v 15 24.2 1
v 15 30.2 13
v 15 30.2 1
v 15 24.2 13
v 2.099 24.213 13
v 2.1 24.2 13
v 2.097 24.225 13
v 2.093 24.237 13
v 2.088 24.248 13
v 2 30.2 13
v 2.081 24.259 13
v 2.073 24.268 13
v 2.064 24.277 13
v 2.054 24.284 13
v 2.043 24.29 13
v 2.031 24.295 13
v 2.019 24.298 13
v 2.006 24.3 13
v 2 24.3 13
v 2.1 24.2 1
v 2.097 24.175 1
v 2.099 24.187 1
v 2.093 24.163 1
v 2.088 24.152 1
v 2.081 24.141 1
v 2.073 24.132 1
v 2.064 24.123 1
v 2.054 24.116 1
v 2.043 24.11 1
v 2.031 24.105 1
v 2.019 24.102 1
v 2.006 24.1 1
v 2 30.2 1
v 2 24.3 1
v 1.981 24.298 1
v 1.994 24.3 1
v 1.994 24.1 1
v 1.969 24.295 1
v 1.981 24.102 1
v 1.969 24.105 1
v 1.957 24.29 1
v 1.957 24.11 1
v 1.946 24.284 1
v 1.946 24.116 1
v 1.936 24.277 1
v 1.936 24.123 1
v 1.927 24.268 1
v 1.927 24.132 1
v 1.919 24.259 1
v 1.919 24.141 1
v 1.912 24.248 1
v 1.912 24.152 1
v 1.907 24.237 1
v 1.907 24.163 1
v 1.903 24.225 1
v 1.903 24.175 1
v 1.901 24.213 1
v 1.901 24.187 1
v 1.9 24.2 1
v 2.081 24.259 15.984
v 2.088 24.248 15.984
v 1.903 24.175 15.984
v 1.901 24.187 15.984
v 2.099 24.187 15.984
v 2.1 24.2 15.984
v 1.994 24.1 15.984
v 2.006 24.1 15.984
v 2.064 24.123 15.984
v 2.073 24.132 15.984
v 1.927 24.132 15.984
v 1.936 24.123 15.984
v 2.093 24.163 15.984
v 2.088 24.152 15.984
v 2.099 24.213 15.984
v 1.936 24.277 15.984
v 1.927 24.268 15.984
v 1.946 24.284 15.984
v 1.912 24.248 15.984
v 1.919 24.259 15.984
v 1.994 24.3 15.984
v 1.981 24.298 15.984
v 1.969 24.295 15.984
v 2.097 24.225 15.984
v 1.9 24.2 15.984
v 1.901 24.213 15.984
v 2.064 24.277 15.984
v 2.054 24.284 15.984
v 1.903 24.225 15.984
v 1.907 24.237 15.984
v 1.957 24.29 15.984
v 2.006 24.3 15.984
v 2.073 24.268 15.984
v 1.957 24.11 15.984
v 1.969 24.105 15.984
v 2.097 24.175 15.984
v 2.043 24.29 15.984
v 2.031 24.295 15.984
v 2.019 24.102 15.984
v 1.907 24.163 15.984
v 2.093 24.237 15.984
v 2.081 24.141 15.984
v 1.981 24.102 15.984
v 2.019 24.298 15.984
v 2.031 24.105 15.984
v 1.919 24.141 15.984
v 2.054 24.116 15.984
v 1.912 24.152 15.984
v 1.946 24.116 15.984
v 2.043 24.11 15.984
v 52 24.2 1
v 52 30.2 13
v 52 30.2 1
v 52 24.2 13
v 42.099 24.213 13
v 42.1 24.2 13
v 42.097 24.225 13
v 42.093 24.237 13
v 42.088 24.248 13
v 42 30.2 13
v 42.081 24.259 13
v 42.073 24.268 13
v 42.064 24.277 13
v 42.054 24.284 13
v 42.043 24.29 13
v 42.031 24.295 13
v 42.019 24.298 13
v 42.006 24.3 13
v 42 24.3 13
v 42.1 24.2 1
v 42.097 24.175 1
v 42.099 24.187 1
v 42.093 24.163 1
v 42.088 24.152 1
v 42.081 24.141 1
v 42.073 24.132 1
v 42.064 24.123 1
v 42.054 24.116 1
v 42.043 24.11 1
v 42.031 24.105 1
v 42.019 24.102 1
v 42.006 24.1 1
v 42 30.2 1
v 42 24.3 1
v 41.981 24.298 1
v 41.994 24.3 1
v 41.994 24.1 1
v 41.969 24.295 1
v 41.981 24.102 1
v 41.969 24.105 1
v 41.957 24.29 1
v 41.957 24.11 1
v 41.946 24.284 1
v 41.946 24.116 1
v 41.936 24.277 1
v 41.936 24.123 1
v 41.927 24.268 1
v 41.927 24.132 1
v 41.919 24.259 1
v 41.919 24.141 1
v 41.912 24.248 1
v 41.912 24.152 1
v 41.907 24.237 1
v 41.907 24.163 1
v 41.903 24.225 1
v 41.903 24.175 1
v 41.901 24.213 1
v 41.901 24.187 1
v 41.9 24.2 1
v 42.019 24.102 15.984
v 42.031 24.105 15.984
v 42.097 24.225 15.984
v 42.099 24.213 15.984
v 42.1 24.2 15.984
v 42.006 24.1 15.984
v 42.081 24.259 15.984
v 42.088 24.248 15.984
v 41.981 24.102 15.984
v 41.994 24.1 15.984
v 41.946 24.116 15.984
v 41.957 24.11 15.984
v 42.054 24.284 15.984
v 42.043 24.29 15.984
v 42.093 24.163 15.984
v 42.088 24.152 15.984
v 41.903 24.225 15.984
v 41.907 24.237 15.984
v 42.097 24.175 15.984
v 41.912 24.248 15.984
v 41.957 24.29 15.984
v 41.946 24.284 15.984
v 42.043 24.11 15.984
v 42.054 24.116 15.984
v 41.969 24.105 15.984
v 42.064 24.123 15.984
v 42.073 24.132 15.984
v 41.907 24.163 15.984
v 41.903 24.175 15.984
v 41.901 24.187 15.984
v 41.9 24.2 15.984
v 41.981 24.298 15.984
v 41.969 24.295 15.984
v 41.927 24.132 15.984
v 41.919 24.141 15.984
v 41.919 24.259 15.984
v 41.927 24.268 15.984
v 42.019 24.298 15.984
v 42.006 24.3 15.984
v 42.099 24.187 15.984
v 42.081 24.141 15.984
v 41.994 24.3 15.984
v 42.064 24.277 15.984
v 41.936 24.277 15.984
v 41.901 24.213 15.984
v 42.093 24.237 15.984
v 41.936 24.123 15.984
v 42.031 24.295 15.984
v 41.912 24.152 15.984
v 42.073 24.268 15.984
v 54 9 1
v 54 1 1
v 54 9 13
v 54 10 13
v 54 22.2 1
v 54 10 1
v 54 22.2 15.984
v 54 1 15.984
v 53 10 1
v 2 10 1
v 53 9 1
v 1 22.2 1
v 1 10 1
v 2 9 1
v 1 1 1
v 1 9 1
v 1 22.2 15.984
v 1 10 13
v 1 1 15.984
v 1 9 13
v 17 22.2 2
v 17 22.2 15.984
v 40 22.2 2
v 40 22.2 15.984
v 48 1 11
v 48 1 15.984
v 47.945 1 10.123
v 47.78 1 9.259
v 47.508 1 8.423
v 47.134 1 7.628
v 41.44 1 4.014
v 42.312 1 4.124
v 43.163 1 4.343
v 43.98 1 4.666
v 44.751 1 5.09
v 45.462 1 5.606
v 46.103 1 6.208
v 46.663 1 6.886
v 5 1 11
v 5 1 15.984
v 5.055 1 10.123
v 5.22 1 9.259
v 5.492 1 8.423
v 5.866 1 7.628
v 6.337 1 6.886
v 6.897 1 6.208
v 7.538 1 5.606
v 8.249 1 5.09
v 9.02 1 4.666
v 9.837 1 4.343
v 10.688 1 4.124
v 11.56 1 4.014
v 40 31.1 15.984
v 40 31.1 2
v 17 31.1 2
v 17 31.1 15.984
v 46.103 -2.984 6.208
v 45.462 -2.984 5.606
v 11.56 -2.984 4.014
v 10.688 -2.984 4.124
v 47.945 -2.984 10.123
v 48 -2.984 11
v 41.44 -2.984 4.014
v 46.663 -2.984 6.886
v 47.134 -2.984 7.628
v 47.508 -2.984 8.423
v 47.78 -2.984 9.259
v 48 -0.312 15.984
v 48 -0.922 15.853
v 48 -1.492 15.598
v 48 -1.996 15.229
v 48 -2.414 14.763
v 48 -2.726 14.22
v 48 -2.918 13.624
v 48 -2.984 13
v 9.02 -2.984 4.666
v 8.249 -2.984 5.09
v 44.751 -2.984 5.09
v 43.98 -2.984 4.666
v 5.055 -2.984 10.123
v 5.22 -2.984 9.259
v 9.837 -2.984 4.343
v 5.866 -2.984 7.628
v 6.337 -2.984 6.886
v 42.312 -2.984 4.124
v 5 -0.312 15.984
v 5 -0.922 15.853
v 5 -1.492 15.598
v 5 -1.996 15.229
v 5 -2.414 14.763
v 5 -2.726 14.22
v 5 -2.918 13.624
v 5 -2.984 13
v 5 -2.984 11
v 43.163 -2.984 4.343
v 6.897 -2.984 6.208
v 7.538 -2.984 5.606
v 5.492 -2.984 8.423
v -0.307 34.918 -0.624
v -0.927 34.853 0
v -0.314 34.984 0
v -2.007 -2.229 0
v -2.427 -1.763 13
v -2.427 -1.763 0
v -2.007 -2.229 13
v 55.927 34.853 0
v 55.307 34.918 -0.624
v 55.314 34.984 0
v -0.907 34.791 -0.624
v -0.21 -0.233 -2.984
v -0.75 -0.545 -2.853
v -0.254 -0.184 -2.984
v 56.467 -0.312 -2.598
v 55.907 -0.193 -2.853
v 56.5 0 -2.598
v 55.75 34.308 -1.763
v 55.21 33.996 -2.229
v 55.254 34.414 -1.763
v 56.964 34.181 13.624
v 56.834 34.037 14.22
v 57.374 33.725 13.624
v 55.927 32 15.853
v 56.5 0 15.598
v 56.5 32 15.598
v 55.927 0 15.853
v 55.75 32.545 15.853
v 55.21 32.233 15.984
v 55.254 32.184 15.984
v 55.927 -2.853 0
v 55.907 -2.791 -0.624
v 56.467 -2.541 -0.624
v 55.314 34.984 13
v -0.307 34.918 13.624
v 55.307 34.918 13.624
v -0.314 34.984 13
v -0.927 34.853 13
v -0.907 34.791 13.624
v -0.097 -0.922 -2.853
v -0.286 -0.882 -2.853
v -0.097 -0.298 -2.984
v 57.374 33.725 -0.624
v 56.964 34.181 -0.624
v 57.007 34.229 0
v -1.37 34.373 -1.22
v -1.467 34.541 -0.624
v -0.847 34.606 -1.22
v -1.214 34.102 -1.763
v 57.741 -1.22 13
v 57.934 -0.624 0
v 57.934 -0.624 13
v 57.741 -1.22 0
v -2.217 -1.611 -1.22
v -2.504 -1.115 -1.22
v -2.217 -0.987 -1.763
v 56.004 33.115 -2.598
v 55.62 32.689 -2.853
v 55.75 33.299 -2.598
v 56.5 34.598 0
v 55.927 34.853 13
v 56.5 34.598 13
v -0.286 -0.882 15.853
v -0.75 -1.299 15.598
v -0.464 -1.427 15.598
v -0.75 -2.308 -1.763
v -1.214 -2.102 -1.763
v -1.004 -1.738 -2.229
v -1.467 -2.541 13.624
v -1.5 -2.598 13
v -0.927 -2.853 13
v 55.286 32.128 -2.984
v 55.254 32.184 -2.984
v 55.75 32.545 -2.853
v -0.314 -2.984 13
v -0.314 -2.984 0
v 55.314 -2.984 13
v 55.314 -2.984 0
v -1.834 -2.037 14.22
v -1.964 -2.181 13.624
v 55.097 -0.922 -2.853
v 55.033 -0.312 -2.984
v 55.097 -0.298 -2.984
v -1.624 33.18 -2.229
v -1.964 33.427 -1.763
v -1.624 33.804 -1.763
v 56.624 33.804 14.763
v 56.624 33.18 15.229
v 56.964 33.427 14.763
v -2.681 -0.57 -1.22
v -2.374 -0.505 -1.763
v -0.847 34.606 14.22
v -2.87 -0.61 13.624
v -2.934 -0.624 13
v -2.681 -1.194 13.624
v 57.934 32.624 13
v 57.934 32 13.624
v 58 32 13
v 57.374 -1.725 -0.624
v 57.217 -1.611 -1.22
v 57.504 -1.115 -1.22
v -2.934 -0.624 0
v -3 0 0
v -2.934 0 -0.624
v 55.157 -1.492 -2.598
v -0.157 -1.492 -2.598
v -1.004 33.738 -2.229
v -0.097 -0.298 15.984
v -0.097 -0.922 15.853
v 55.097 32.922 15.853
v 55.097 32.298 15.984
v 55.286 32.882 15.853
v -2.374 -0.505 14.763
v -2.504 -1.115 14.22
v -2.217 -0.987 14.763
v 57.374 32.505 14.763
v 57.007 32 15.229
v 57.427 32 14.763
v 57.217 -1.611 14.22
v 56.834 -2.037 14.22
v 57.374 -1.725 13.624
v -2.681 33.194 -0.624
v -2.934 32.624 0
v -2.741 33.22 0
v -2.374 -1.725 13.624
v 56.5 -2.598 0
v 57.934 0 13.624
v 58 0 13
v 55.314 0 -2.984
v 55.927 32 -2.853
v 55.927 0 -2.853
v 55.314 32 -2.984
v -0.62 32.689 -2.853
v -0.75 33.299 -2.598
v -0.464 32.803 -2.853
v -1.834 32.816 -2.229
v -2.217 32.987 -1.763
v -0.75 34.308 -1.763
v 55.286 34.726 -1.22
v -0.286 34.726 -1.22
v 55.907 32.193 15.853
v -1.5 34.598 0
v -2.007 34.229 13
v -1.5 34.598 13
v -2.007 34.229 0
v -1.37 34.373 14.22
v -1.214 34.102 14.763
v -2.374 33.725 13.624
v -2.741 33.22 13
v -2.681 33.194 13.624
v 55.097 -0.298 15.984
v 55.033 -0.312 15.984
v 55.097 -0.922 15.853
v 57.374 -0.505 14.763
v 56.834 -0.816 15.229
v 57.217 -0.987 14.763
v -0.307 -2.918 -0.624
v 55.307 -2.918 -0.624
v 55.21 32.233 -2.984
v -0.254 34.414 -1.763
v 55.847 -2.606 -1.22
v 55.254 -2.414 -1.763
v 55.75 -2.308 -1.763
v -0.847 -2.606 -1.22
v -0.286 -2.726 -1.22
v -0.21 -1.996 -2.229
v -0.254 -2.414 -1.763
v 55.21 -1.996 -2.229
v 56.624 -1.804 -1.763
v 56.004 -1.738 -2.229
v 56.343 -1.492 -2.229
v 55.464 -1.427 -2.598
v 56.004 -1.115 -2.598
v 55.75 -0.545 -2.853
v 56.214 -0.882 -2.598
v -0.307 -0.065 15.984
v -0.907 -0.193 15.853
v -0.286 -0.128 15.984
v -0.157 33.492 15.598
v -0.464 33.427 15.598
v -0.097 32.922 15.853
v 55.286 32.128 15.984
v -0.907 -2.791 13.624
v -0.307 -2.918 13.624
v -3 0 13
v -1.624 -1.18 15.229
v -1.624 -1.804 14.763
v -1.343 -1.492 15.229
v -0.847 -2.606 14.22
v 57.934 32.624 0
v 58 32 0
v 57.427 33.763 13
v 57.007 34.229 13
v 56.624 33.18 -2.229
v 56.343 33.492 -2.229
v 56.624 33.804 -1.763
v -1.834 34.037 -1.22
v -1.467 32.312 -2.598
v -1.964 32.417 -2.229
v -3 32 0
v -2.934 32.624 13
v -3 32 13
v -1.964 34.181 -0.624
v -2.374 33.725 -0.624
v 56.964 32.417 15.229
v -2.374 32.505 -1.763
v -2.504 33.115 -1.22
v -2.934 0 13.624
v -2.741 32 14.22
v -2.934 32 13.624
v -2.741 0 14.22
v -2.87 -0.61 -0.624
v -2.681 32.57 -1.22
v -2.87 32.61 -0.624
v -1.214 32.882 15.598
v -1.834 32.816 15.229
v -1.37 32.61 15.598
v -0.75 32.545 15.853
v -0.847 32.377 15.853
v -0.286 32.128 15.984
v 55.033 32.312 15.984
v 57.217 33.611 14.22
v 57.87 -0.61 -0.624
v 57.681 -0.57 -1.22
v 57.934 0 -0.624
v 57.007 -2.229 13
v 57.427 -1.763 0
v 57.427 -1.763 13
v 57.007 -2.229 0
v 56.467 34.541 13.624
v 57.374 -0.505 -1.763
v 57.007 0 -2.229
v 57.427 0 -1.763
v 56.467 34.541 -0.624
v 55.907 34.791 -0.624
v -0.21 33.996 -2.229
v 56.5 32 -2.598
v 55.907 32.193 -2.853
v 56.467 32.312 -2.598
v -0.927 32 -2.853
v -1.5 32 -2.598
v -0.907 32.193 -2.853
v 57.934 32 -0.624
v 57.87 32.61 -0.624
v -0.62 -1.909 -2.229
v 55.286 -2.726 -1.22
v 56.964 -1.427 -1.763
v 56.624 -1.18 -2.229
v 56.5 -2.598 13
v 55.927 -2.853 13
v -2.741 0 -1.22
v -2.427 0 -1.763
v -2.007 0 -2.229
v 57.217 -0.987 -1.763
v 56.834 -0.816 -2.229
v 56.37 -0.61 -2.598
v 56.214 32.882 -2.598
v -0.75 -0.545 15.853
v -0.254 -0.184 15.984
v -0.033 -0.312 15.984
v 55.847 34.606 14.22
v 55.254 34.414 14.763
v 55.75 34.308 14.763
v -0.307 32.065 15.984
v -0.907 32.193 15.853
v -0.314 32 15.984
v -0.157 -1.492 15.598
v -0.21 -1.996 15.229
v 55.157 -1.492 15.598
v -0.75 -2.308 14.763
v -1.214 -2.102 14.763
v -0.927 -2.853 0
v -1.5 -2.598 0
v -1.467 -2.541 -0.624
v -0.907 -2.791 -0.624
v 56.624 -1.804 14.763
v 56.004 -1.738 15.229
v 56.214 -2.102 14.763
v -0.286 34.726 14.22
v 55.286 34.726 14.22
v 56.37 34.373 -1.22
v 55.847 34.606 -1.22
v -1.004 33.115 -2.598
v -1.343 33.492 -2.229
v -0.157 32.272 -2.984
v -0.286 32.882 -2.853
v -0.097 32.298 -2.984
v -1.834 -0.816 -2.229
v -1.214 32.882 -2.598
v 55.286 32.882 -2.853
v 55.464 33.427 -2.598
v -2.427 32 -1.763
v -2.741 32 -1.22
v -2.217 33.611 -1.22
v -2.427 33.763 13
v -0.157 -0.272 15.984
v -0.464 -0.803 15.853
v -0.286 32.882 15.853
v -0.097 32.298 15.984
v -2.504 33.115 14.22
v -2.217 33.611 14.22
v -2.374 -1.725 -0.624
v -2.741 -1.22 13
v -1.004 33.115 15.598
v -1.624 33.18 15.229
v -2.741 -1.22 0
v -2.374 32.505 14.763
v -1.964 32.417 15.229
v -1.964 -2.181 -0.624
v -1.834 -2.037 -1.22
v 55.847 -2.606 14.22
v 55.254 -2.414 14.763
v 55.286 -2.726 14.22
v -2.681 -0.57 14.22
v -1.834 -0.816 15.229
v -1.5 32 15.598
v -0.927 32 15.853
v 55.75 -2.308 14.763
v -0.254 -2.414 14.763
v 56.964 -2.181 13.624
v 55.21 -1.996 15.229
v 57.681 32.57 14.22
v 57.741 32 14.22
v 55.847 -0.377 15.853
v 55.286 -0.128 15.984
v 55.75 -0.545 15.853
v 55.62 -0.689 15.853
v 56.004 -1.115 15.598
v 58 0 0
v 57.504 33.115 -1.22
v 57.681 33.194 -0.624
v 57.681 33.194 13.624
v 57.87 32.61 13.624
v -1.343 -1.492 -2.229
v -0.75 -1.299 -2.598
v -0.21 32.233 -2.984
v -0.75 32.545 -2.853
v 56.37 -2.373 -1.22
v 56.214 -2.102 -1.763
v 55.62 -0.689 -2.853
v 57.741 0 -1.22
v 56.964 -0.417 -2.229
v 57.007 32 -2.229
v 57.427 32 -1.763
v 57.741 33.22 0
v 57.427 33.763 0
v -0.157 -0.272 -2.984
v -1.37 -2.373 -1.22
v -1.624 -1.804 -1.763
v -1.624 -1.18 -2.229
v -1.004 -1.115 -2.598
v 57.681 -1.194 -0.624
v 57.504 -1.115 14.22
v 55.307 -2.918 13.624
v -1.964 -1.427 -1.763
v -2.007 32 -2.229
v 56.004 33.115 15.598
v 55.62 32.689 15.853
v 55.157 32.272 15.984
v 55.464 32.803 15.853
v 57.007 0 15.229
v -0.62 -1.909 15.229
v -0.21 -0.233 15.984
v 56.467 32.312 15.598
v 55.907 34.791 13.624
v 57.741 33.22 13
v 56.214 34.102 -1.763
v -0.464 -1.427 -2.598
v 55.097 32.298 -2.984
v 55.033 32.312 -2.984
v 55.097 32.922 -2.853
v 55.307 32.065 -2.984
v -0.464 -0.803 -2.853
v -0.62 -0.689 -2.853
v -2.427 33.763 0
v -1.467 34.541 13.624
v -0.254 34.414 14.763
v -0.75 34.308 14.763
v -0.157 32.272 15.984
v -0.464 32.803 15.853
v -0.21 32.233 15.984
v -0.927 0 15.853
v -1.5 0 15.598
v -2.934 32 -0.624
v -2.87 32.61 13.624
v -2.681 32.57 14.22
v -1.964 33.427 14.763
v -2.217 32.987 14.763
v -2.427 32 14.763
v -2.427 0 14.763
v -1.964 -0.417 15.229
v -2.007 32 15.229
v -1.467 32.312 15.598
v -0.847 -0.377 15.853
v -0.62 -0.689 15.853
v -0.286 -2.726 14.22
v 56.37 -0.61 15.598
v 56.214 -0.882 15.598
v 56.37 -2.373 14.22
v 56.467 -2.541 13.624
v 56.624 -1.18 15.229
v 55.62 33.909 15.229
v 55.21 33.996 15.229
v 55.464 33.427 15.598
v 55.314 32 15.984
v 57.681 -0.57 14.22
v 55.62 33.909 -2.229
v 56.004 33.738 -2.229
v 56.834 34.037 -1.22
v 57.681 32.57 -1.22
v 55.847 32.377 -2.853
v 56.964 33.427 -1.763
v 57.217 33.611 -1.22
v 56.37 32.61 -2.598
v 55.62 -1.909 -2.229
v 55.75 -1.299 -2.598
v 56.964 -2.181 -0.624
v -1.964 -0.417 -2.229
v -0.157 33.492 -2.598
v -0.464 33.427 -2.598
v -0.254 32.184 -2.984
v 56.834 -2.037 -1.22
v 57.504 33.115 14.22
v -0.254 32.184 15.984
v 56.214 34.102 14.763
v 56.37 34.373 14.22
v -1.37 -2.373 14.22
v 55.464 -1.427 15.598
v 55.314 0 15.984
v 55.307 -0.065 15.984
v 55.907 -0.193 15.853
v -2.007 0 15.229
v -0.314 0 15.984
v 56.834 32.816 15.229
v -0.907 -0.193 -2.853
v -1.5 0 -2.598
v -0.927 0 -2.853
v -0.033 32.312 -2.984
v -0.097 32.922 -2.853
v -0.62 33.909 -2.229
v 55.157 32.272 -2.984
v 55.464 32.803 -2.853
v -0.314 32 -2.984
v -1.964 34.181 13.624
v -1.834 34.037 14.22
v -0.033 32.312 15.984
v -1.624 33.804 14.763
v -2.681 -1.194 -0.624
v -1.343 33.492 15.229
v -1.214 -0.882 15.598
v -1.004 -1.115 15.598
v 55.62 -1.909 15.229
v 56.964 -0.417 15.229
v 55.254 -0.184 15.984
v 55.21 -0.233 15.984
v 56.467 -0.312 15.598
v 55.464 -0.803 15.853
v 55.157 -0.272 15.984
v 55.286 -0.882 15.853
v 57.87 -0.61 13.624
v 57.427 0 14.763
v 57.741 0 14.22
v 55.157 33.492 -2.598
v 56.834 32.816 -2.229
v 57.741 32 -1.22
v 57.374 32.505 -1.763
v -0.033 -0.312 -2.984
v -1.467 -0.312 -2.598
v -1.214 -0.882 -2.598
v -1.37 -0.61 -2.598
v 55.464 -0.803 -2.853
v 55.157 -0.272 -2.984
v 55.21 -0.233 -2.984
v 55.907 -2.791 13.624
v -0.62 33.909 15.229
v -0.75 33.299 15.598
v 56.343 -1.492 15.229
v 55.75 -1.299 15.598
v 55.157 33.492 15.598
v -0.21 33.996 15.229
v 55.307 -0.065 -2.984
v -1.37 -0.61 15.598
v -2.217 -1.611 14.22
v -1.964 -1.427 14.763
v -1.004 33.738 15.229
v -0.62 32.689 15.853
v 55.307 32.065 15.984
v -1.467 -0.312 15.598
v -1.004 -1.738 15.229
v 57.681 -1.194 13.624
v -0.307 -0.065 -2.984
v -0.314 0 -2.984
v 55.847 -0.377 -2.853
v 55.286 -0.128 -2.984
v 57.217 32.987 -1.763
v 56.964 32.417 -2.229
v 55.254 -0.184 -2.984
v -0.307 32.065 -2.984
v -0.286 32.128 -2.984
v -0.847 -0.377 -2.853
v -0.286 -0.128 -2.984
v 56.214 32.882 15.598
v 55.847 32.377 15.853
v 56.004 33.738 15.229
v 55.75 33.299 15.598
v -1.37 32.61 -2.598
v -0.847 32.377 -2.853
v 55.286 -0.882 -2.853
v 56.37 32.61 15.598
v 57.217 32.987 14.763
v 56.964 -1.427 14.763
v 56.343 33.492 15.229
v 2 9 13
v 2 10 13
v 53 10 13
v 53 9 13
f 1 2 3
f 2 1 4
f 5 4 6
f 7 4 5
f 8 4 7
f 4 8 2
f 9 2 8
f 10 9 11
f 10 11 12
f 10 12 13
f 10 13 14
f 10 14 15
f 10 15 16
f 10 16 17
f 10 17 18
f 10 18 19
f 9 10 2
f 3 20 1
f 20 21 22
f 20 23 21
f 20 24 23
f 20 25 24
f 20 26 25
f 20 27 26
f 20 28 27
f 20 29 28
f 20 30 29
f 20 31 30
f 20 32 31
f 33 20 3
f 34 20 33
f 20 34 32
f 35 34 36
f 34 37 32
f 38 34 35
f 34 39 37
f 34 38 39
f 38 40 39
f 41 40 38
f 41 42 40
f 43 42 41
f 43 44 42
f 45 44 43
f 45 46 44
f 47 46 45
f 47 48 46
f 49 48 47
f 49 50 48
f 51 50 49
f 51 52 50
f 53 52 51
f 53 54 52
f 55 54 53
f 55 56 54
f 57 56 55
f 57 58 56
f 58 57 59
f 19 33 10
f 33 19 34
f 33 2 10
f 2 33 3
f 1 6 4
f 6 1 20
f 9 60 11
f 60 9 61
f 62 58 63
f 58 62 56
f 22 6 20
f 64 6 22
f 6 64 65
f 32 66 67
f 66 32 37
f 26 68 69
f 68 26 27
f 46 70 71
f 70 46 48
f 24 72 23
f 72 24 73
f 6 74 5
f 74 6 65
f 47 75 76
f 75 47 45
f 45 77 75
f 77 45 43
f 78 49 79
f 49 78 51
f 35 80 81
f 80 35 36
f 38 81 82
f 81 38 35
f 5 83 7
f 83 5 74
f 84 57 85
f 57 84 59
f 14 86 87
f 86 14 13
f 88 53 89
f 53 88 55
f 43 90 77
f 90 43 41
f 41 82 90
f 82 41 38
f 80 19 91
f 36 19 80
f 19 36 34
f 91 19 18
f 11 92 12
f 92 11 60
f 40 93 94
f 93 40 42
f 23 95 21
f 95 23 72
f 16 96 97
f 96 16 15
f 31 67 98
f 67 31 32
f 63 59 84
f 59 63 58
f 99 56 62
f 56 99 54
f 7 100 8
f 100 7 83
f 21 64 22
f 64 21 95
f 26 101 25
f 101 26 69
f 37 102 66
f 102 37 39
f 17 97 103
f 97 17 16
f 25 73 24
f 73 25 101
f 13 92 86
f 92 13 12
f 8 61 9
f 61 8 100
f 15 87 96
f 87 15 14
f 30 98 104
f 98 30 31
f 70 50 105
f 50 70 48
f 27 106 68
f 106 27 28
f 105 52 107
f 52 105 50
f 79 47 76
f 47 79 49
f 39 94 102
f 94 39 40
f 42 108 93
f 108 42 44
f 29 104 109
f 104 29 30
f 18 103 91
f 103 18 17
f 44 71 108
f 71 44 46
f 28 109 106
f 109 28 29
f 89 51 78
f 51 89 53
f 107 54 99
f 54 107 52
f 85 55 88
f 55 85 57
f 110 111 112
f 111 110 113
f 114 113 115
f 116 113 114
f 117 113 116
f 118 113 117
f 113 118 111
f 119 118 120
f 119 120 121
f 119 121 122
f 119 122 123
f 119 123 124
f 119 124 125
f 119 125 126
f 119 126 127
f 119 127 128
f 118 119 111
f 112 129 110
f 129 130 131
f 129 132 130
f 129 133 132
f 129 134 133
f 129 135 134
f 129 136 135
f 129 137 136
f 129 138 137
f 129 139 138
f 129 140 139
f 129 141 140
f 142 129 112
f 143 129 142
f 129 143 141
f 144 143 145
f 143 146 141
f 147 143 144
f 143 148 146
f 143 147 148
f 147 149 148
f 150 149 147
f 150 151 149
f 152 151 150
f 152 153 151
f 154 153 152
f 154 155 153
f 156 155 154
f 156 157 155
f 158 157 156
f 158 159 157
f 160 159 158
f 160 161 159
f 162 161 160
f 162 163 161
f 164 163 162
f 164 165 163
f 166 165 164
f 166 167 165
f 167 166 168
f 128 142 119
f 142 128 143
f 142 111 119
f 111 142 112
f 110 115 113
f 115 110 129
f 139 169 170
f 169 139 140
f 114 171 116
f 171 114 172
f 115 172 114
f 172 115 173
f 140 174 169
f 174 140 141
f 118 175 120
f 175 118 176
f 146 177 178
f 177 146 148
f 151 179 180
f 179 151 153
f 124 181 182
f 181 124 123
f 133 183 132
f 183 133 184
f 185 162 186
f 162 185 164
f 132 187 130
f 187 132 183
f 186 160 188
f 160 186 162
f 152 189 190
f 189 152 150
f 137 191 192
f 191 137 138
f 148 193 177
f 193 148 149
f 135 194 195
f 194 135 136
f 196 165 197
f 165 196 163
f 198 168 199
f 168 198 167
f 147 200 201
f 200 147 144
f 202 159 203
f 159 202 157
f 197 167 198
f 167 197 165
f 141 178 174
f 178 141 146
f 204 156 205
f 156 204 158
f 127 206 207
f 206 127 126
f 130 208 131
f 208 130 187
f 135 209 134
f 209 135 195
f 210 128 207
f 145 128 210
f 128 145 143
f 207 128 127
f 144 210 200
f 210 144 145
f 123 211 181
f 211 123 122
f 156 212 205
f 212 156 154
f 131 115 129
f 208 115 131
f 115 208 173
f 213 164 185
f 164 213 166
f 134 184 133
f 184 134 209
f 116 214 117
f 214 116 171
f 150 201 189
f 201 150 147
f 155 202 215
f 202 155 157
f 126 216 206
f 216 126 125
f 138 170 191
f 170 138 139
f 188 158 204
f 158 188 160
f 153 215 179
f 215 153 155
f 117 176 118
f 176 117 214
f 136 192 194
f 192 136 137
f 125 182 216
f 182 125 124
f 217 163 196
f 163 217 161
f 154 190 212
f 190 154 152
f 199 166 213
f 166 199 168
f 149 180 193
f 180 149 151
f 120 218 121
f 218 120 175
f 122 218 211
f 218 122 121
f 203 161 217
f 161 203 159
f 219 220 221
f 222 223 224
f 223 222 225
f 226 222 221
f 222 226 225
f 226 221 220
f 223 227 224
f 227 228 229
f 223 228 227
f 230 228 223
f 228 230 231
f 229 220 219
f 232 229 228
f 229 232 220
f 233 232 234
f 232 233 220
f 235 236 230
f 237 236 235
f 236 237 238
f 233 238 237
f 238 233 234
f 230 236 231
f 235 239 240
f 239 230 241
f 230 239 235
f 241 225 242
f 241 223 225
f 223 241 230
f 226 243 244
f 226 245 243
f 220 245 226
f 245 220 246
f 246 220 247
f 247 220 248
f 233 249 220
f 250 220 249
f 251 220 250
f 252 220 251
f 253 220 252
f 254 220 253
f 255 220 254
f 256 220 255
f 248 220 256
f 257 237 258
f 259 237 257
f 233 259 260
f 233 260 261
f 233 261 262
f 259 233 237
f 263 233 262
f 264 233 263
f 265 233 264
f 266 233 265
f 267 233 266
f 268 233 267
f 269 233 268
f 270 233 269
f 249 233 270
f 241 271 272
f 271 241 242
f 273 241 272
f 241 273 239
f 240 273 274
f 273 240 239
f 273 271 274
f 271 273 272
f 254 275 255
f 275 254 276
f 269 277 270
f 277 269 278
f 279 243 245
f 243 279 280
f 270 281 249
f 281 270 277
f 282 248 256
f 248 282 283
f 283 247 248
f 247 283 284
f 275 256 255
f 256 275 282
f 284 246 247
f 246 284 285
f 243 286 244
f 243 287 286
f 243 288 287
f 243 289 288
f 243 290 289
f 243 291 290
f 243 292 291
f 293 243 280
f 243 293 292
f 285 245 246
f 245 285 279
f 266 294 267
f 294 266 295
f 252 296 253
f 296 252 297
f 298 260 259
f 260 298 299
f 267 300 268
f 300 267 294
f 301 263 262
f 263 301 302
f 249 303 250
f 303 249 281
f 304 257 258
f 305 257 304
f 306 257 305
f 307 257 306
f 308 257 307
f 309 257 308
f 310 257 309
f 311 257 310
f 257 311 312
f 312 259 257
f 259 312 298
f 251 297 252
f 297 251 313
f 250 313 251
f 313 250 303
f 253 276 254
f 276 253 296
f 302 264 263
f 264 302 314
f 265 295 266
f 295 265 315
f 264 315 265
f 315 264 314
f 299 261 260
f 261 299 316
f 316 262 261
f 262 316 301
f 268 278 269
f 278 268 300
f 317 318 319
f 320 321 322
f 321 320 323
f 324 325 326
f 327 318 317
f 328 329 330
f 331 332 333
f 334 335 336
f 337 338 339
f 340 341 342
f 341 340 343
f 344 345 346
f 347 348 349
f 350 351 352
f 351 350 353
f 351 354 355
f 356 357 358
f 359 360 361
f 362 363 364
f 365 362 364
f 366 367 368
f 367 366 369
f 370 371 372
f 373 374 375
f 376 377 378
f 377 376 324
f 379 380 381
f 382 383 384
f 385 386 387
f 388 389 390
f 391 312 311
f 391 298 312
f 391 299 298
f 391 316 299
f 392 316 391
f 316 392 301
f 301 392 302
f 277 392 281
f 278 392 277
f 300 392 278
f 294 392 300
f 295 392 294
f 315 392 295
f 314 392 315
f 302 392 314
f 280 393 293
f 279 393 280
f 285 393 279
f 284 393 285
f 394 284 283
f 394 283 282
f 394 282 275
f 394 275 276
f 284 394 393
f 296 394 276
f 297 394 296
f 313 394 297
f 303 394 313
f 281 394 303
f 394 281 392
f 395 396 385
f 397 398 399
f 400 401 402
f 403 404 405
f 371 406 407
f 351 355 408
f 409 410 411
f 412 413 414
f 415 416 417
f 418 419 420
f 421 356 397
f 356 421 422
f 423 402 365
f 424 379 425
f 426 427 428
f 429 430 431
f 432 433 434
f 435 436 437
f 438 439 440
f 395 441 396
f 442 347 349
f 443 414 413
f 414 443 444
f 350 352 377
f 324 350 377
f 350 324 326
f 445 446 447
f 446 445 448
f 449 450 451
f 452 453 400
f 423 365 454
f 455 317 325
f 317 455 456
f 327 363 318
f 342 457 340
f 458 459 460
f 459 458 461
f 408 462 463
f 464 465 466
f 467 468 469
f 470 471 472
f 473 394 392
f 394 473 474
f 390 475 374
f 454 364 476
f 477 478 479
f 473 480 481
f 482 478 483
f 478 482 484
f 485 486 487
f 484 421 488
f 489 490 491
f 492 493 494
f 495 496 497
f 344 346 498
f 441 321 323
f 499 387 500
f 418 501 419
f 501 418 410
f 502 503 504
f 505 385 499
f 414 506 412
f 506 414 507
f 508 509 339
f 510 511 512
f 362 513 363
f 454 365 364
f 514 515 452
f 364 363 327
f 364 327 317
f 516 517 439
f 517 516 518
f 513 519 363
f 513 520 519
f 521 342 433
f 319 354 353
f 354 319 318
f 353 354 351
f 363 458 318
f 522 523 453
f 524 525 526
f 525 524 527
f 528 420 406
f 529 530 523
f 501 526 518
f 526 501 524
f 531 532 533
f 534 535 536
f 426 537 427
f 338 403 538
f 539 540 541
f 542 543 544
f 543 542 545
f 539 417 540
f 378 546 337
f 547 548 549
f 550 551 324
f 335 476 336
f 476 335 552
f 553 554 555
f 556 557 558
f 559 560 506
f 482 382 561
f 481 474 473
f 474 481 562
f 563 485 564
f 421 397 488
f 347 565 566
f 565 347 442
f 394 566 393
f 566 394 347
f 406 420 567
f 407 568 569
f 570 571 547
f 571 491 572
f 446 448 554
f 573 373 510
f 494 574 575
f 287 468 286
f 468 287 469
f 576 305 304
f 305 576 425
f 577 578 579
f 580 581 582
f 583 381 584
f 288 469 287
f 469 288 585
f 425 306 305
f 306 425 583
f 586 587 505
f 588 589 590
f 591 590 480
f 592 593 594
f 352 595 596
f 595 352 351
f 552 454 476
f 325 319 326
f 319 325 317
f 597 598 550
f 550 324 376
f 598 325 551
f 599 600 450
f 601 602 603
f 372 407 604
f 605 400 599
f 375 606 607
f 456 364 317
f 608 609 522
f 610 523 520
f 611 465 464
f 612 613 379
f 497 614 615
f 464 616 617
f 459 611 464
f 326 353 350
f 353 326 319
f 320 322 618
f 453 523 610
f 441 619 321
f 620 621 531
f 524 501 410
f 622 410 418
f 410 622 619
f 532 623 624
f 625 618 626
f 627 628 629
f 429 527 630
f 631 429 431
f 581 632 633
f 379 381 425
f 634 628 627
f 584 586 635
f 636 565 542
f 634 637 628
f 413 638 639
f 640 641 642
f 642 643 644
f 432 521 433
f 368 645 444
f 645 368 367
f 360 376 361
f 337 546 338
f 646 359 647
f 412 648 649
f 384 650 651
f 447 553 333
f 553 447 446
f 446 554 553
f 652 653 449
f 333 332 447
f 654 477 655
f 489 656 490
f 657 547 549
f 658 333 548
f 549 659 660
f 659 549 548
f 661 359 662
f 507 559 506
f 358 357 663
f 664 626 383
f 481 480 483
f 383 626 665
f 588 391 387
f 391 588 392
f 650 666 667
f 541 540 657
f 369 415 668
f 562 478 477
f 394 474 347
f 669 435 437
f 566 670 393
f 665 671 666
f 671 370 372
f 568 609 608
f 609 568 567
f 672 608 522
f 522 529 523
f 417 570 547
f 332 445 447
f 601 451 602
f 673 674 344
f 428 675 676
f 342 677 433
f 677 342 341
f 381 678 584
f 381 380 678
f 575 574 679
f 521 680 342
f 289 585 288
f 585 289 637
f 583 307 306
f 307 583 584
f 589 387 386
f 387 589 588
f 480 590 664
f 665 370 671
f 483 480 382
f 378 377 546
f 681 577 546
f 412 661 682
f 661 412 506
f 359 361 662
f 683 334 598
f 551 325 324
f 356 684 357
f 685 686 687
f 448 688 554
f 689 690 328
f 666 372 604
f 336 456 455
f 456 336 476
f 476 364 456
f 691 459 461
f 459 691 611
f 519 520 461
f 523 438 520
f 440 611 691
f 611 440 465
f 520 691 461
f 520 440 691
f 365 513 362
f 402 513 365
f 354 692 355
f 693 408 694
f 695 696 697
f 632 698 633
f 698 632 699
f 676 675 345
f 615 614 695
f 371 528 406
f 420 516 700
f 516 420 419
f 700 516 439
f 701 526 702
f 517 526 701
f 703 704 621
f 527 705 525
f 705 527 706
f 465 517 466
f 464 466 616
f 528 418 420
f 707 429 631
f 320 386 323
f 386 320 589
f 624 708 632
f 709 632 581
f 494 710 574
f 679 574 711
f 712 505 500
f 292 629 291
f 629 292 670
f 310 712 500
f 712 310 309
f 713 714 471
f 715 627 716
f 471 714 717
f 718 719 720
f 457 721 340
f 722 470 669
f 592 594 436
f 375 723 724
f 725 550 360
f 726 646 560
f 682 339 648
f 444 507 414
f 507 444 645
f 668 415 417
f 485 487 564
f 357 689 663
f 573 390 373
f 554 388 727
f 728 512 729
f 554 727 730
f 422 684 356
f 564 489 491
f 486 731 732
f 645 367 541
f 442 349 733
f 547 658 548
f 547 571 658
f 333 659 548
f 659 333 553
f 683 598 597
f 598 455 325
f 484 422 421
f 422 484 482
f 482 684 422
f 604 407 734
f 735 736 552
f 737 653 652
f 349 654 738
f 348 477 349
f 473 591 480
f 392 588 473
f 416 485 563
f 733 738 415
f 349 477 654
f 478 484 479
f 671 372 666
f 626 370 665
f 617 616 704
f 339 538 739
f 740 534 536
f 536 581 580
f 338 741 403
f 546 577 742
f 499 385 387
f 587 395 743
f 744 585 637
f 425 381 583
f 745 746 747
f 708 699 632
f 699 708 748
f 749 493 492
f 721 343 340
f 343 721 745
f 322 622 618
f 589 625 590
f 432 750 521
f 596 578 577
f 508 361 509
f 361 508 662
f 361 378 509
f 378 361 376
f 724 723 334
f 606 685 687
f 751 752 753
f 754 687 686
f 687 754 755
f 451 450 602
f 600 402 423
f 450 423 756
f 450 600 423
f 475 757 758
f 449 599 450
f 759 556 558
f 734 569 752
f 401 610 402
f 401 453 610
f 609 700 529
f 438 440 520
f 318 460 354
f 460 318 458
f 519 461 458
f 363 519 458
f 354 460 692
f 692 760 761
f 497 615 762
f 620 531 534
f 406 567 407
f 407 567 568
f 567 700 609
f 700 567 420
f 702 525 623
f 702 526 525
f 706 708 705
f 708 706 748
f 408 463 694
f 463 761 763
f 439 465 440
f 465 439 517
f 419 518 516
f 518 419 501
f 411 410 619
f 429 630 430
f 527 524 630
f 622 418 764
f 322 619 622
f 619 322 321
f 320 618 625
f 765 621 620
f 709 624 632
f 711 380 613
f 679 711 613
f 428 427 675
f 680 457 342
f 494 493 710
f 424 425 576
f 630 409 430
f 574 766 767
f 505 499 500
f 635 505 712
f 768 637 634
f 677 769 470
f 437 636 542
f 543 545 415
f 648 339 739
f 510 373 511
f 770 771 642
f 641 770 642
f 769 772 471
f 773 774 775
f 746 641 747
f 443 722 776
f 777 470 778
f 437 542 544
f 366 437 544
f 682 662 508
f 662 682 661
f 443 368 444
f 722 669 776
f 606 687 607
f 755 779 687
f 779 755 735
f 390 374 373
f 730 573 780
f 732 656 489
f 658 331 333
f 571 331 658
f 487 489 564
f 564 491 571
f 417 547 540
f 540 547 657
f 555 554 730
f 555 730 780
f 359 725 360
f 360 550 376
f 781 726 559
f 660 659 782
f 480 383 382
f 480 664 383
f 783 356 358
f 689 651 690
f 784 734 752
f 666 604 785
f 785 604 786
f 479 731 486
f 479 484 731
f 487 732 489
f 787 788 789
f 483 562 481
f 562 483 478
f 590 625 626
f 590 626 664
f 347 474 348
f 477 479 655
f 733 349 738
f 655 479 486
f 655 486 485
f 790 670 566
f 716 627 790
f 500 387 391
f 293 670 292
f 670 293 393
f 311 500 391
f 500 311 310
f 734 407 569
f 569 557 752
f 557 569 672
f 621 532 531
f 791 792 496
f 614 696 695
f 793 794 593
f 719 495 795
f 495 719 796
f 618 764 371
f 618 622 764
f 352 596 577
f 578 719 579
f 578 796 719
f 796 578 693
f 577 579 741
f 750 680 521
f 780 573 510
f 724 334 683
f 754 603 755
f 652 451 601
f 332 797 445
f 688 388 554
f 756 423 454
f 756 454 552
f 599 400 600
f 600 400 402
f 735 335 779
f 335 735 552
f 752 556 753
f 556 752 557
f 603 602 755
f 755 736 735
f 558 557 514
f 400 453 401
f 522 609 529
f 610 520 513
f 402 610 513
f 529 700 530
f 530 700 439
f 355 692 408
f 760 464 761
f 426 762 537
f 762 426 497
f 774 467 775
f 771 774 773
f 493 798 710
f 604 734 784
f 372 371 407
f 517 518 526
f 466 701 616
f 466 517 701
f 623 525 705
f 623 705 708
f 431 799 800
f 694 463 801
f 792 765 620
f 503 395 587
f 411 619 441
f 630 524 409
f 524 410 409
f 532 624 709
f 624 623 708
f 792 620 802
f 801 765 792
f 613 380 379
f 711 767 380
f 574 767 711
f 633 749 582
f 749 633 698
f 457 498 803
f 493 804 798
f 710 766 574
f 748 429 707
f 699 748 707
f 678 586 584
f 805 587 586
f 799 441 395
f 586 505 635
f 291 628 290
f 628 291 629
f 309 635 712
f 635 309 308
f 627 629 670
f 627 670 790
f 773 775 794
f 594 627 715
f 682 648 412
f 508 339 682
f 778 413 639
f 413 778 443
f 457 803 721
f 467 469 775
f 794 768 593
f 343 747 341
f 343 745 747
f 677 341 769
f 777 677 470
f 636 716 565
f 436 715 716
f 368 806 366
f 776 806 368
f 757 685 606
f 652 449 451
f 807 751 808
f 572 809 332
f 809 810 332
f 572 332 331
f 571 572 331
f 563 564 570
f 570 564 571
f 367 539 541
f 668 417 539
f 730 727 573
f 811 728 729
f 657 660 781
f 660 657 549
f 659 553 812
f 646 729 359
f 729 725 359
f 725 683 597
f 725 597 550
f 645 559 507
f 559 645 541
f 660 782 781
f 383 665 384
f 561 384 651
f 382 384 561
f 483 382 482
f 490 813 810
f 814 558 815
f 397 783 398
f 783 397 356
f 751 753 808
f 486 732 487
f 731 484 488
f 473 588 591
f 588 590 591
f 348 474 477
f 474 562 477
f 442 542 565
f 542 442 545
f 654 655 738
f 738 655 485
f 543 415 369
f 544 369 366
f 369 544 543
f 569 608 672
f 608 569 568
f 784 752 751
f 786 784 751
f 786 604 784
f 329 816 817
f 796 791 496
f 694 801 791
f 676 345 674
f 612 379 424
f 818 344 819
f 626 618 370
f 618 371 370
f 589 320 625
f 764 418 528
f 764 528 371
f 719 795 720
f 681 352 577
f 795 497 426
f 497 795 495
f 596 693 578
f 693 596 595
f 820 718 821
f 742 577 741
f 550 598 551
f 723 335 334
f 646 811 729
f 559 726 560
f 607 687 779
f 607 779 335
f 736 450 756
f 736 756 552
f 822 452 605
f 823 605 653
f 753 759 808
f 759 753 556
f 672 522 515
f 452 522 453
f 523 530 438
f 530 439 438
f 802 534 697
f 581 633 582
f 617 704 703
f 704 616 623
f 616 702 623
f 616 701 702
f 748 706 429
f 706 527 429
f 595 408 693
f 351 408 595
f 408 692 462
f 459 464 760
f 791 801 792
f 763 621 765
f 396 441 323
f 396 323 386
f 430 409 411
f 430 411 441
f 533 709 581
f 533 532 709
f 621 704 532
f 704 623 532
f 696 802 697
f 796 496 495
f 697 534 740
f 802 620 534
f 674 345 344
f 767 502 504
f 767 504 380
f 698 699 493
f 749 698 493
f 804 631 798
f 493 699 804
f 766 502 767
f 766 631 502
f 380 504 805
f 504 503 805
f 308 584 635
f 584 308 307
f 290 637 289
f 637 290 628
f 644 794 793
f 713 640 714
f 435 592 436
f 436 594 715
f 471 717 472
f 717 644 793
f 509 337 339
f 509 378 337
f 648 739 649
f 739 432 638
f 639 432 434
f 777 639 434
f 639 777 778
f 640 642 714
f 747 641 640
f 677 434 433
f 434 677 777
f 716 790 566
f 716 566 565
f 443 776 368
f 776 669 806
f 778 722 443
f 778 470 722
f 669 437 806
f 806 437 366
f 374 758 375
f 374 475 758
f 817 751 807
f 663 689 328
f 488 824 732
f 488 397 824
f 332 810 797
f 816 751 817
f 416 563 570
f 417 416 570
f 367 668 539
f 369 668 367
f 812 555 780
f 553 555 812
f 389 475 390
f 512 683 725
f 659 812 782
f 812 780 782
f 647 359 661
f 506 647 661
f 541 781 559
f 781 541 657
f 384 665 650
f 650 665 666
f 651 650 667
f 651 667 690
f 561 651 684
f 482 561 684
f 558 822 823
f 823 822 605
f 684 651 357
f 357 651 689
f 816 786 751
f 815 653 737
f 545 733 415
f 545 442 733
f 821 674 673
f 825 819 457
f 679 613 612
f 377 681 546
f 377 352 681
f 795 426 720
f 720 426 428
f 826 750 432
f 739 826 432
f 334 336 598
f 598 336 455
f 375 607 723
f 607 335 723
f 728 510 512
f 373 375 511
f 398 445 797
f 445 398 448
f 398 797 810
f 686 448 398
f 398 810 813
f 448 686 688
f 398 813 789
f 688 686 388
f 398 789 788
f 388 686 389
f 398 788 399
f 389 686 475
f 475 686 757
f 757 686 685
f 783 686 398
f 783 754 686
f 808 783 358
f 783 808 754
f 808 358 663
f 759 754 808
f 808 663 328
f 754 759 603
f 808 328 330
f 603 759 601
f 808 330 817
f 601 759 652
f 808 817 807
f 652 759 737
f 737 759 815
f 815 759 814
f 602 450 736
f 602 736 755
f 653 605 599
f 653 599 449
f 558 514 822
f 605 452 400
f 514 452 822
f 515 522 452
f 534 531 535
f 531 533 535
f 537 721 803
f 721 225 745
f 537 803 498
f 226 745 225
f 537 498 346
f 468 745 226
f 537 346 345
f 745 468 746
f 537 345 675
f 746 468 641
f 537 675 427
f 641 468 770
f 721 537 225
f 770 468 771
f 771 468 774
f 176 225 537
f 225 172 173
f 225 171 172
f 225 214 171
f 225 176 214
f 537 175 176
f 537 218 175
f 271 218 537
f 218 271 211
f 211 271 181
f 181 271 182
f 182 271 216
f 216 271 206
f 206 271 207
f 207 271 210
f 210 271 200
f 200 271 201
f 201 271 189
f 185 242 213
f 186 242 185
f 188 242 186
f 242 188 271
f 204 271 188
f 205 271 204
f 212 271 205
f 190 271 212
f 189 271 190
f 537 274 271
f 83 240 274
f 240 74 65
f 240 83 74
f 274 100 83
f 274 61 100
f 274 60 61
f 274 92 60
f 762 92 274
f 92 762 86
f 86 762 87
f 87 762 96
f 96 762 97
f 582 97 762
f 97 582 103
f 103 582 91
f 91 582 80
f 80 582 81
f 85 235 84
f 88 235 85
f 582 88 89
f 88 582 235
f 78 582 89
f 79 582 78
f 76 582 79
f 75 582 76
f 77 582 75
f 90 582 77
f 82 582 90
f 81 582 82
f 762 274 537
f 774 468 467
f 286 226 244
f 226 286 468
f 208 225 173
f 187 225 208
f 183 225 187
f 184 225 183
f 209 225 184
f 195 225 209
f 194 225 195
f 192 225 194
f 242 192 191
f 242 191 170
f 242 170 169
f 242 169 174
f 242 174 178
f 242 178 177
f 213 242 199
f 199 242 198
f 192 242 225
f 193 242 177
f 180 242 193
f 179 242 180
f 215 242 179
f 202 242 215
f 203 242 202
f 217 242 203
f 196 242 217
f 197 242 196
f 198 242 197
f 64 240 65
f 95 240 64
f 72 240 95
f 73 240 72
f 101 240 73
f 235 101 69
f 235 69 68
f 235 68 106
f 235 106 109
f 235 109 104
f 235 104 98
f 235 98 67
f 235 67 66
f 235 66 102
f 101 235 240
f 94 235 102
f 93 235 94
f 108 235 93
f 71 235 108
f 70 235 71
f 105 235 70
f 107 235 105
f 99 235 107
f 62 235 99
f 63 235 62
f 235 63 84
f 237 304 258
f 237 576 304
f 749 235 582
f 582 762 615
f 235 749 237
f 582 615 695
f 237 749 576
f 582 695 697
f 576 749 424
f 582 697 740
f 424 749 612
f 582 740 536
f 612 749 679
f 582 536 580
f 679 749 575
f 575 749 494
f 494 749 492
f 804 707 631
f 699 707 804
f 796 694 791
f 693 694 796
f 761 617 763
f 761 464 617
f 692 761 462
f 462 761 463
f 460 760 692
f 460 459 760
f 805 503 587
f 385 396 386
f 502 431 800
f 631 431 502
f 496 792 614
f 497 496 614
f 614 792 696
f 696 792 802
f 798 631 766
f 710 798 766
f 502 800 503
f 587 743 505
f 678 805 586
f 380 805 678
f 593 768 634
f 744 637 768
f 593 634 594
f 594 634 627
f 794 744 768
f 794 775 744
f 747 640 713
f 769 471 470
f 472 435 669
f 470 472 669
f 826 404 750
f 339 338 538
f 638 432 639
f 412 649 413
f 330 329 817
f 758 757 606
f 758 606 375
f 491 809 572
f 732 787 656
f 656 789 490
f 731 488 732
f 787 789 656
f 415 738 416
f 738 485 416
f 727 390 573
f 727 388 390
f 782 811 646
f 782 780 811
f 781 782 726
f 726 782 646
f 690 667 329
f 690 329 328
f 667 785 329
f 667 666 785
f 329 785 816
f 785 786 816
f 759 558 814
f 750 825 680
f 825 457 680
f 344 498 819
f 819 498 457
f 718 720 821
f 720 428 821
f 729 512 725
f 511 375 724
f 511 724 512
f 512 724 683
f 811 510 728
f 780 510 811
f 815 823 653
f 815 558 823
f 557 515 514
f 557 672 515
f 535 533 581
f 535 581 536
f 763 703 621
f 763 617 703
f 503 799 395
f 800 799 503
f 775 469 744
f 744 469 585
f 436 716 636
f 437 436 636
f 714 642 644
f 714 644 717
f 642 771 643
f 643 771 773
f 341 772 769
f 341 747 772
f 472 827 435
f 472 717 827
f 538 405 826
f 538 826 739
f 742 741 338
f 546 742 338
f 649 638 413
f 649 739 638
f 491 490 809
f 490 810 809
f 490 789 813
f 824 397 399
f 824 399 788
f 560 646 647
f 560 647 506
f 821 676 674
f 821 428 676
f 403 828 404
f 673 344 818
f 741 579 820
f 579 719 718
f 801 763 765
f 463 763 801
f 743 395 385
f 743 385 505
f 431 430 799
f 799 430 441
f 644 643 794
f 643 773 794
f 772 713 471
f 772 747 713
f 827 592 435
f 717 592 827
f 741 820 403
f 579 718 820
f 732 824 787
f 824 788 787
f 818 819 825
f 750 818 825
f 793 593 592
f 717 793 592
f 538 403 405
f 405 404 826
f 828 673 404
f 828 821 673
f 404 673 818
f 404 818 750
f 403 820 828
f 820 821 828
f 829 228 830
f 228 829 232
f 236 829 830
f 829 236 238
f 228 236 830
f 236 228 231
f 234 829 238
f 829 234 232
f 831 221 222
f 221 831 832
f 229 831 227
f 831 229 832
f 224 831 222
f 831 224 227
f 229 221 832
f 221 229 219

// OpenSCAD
// [FL_INDEX: keywords="openscad, 3d_parametric, Swissphone_BOSS_Stand, csg_solid" | COT="Parametric OpenSCAD design from 3DCodeverse"]
// Title: Swissphone BOSS Stand

rand=1;			//Vertical Wall w/o minkowski sum
breite=53;			//Width ob main block 53sw 53.2bl
dicke=30;			//Thickness of main block
tiefe=12;			//Depth of main block w/o minkowski sum
fuss=1;				//Thickness of lower wall
dicke2=21.20;		//Thickness inner block
minkowskifn=30;	//reduce for speed


difference(){
	union(){
	minkowski(){
		cube([breite+(2*rand),dicke+2*rand,tiefe+fuss]); 					//Main Block	
		sphere(3,$fn=minkowskifn);
	}
	}
	union(){
		translate([rand,rand,fuss])
			cube([breite,dicke2,tiefe+10]);    								//Inner Block
		translate([17,rand+dicke2-0.1,fuss+1])
			cube([23,9,25]);													//Block for the Beltclip
		
		hull(){
			translate([12,5,10+fuss]){											//Frontwindow
				rotate([90,0,0])
				cylinder(h=10,r=7,$fn=50);
			}
			translate([breite-12,5,10+fuss]){
				rotate([90,0,0])
				cylinder(h=10,r=7,$fn=50);
			}
			translate([breite-12,5,10+fuss+20]){
				rotate([90,0,0])
				cylinder(h=10,r=7,$fn=50);
			}
			translate([12,5,10+fuss+20]){
				rotate([90,0,0])
				cylinder(h=10,r=7,$fn=50);
			}
		}											//Holes for Magnets 4mm*10mm (S-04-10-N supermagnete.de)
			//translate([8,27,-5]){
			//	cylinder(h=15,r=2,$fn=50);
			//}
			//translate([47,27,-5]){
			//	cylinder(h=15,r=2,$fn=50);
			//}
			translate([rand+1,dicke2+3,fuss]){
				cube([13,6,12]);
				#cylinder(h=20,r=0.1,$fn=50);
			}
			translate([42,dicke2+3,fuss]){
				cube([10,6,12]);
				#cylinder(h=20,r=0.1,$fn=50);
			}
	}
}
translate([rand,9,fuss])		//Haltestifte
	cube([1,1,12]);
translate([breite,9,fuss])
	cube([1,1,12]);
